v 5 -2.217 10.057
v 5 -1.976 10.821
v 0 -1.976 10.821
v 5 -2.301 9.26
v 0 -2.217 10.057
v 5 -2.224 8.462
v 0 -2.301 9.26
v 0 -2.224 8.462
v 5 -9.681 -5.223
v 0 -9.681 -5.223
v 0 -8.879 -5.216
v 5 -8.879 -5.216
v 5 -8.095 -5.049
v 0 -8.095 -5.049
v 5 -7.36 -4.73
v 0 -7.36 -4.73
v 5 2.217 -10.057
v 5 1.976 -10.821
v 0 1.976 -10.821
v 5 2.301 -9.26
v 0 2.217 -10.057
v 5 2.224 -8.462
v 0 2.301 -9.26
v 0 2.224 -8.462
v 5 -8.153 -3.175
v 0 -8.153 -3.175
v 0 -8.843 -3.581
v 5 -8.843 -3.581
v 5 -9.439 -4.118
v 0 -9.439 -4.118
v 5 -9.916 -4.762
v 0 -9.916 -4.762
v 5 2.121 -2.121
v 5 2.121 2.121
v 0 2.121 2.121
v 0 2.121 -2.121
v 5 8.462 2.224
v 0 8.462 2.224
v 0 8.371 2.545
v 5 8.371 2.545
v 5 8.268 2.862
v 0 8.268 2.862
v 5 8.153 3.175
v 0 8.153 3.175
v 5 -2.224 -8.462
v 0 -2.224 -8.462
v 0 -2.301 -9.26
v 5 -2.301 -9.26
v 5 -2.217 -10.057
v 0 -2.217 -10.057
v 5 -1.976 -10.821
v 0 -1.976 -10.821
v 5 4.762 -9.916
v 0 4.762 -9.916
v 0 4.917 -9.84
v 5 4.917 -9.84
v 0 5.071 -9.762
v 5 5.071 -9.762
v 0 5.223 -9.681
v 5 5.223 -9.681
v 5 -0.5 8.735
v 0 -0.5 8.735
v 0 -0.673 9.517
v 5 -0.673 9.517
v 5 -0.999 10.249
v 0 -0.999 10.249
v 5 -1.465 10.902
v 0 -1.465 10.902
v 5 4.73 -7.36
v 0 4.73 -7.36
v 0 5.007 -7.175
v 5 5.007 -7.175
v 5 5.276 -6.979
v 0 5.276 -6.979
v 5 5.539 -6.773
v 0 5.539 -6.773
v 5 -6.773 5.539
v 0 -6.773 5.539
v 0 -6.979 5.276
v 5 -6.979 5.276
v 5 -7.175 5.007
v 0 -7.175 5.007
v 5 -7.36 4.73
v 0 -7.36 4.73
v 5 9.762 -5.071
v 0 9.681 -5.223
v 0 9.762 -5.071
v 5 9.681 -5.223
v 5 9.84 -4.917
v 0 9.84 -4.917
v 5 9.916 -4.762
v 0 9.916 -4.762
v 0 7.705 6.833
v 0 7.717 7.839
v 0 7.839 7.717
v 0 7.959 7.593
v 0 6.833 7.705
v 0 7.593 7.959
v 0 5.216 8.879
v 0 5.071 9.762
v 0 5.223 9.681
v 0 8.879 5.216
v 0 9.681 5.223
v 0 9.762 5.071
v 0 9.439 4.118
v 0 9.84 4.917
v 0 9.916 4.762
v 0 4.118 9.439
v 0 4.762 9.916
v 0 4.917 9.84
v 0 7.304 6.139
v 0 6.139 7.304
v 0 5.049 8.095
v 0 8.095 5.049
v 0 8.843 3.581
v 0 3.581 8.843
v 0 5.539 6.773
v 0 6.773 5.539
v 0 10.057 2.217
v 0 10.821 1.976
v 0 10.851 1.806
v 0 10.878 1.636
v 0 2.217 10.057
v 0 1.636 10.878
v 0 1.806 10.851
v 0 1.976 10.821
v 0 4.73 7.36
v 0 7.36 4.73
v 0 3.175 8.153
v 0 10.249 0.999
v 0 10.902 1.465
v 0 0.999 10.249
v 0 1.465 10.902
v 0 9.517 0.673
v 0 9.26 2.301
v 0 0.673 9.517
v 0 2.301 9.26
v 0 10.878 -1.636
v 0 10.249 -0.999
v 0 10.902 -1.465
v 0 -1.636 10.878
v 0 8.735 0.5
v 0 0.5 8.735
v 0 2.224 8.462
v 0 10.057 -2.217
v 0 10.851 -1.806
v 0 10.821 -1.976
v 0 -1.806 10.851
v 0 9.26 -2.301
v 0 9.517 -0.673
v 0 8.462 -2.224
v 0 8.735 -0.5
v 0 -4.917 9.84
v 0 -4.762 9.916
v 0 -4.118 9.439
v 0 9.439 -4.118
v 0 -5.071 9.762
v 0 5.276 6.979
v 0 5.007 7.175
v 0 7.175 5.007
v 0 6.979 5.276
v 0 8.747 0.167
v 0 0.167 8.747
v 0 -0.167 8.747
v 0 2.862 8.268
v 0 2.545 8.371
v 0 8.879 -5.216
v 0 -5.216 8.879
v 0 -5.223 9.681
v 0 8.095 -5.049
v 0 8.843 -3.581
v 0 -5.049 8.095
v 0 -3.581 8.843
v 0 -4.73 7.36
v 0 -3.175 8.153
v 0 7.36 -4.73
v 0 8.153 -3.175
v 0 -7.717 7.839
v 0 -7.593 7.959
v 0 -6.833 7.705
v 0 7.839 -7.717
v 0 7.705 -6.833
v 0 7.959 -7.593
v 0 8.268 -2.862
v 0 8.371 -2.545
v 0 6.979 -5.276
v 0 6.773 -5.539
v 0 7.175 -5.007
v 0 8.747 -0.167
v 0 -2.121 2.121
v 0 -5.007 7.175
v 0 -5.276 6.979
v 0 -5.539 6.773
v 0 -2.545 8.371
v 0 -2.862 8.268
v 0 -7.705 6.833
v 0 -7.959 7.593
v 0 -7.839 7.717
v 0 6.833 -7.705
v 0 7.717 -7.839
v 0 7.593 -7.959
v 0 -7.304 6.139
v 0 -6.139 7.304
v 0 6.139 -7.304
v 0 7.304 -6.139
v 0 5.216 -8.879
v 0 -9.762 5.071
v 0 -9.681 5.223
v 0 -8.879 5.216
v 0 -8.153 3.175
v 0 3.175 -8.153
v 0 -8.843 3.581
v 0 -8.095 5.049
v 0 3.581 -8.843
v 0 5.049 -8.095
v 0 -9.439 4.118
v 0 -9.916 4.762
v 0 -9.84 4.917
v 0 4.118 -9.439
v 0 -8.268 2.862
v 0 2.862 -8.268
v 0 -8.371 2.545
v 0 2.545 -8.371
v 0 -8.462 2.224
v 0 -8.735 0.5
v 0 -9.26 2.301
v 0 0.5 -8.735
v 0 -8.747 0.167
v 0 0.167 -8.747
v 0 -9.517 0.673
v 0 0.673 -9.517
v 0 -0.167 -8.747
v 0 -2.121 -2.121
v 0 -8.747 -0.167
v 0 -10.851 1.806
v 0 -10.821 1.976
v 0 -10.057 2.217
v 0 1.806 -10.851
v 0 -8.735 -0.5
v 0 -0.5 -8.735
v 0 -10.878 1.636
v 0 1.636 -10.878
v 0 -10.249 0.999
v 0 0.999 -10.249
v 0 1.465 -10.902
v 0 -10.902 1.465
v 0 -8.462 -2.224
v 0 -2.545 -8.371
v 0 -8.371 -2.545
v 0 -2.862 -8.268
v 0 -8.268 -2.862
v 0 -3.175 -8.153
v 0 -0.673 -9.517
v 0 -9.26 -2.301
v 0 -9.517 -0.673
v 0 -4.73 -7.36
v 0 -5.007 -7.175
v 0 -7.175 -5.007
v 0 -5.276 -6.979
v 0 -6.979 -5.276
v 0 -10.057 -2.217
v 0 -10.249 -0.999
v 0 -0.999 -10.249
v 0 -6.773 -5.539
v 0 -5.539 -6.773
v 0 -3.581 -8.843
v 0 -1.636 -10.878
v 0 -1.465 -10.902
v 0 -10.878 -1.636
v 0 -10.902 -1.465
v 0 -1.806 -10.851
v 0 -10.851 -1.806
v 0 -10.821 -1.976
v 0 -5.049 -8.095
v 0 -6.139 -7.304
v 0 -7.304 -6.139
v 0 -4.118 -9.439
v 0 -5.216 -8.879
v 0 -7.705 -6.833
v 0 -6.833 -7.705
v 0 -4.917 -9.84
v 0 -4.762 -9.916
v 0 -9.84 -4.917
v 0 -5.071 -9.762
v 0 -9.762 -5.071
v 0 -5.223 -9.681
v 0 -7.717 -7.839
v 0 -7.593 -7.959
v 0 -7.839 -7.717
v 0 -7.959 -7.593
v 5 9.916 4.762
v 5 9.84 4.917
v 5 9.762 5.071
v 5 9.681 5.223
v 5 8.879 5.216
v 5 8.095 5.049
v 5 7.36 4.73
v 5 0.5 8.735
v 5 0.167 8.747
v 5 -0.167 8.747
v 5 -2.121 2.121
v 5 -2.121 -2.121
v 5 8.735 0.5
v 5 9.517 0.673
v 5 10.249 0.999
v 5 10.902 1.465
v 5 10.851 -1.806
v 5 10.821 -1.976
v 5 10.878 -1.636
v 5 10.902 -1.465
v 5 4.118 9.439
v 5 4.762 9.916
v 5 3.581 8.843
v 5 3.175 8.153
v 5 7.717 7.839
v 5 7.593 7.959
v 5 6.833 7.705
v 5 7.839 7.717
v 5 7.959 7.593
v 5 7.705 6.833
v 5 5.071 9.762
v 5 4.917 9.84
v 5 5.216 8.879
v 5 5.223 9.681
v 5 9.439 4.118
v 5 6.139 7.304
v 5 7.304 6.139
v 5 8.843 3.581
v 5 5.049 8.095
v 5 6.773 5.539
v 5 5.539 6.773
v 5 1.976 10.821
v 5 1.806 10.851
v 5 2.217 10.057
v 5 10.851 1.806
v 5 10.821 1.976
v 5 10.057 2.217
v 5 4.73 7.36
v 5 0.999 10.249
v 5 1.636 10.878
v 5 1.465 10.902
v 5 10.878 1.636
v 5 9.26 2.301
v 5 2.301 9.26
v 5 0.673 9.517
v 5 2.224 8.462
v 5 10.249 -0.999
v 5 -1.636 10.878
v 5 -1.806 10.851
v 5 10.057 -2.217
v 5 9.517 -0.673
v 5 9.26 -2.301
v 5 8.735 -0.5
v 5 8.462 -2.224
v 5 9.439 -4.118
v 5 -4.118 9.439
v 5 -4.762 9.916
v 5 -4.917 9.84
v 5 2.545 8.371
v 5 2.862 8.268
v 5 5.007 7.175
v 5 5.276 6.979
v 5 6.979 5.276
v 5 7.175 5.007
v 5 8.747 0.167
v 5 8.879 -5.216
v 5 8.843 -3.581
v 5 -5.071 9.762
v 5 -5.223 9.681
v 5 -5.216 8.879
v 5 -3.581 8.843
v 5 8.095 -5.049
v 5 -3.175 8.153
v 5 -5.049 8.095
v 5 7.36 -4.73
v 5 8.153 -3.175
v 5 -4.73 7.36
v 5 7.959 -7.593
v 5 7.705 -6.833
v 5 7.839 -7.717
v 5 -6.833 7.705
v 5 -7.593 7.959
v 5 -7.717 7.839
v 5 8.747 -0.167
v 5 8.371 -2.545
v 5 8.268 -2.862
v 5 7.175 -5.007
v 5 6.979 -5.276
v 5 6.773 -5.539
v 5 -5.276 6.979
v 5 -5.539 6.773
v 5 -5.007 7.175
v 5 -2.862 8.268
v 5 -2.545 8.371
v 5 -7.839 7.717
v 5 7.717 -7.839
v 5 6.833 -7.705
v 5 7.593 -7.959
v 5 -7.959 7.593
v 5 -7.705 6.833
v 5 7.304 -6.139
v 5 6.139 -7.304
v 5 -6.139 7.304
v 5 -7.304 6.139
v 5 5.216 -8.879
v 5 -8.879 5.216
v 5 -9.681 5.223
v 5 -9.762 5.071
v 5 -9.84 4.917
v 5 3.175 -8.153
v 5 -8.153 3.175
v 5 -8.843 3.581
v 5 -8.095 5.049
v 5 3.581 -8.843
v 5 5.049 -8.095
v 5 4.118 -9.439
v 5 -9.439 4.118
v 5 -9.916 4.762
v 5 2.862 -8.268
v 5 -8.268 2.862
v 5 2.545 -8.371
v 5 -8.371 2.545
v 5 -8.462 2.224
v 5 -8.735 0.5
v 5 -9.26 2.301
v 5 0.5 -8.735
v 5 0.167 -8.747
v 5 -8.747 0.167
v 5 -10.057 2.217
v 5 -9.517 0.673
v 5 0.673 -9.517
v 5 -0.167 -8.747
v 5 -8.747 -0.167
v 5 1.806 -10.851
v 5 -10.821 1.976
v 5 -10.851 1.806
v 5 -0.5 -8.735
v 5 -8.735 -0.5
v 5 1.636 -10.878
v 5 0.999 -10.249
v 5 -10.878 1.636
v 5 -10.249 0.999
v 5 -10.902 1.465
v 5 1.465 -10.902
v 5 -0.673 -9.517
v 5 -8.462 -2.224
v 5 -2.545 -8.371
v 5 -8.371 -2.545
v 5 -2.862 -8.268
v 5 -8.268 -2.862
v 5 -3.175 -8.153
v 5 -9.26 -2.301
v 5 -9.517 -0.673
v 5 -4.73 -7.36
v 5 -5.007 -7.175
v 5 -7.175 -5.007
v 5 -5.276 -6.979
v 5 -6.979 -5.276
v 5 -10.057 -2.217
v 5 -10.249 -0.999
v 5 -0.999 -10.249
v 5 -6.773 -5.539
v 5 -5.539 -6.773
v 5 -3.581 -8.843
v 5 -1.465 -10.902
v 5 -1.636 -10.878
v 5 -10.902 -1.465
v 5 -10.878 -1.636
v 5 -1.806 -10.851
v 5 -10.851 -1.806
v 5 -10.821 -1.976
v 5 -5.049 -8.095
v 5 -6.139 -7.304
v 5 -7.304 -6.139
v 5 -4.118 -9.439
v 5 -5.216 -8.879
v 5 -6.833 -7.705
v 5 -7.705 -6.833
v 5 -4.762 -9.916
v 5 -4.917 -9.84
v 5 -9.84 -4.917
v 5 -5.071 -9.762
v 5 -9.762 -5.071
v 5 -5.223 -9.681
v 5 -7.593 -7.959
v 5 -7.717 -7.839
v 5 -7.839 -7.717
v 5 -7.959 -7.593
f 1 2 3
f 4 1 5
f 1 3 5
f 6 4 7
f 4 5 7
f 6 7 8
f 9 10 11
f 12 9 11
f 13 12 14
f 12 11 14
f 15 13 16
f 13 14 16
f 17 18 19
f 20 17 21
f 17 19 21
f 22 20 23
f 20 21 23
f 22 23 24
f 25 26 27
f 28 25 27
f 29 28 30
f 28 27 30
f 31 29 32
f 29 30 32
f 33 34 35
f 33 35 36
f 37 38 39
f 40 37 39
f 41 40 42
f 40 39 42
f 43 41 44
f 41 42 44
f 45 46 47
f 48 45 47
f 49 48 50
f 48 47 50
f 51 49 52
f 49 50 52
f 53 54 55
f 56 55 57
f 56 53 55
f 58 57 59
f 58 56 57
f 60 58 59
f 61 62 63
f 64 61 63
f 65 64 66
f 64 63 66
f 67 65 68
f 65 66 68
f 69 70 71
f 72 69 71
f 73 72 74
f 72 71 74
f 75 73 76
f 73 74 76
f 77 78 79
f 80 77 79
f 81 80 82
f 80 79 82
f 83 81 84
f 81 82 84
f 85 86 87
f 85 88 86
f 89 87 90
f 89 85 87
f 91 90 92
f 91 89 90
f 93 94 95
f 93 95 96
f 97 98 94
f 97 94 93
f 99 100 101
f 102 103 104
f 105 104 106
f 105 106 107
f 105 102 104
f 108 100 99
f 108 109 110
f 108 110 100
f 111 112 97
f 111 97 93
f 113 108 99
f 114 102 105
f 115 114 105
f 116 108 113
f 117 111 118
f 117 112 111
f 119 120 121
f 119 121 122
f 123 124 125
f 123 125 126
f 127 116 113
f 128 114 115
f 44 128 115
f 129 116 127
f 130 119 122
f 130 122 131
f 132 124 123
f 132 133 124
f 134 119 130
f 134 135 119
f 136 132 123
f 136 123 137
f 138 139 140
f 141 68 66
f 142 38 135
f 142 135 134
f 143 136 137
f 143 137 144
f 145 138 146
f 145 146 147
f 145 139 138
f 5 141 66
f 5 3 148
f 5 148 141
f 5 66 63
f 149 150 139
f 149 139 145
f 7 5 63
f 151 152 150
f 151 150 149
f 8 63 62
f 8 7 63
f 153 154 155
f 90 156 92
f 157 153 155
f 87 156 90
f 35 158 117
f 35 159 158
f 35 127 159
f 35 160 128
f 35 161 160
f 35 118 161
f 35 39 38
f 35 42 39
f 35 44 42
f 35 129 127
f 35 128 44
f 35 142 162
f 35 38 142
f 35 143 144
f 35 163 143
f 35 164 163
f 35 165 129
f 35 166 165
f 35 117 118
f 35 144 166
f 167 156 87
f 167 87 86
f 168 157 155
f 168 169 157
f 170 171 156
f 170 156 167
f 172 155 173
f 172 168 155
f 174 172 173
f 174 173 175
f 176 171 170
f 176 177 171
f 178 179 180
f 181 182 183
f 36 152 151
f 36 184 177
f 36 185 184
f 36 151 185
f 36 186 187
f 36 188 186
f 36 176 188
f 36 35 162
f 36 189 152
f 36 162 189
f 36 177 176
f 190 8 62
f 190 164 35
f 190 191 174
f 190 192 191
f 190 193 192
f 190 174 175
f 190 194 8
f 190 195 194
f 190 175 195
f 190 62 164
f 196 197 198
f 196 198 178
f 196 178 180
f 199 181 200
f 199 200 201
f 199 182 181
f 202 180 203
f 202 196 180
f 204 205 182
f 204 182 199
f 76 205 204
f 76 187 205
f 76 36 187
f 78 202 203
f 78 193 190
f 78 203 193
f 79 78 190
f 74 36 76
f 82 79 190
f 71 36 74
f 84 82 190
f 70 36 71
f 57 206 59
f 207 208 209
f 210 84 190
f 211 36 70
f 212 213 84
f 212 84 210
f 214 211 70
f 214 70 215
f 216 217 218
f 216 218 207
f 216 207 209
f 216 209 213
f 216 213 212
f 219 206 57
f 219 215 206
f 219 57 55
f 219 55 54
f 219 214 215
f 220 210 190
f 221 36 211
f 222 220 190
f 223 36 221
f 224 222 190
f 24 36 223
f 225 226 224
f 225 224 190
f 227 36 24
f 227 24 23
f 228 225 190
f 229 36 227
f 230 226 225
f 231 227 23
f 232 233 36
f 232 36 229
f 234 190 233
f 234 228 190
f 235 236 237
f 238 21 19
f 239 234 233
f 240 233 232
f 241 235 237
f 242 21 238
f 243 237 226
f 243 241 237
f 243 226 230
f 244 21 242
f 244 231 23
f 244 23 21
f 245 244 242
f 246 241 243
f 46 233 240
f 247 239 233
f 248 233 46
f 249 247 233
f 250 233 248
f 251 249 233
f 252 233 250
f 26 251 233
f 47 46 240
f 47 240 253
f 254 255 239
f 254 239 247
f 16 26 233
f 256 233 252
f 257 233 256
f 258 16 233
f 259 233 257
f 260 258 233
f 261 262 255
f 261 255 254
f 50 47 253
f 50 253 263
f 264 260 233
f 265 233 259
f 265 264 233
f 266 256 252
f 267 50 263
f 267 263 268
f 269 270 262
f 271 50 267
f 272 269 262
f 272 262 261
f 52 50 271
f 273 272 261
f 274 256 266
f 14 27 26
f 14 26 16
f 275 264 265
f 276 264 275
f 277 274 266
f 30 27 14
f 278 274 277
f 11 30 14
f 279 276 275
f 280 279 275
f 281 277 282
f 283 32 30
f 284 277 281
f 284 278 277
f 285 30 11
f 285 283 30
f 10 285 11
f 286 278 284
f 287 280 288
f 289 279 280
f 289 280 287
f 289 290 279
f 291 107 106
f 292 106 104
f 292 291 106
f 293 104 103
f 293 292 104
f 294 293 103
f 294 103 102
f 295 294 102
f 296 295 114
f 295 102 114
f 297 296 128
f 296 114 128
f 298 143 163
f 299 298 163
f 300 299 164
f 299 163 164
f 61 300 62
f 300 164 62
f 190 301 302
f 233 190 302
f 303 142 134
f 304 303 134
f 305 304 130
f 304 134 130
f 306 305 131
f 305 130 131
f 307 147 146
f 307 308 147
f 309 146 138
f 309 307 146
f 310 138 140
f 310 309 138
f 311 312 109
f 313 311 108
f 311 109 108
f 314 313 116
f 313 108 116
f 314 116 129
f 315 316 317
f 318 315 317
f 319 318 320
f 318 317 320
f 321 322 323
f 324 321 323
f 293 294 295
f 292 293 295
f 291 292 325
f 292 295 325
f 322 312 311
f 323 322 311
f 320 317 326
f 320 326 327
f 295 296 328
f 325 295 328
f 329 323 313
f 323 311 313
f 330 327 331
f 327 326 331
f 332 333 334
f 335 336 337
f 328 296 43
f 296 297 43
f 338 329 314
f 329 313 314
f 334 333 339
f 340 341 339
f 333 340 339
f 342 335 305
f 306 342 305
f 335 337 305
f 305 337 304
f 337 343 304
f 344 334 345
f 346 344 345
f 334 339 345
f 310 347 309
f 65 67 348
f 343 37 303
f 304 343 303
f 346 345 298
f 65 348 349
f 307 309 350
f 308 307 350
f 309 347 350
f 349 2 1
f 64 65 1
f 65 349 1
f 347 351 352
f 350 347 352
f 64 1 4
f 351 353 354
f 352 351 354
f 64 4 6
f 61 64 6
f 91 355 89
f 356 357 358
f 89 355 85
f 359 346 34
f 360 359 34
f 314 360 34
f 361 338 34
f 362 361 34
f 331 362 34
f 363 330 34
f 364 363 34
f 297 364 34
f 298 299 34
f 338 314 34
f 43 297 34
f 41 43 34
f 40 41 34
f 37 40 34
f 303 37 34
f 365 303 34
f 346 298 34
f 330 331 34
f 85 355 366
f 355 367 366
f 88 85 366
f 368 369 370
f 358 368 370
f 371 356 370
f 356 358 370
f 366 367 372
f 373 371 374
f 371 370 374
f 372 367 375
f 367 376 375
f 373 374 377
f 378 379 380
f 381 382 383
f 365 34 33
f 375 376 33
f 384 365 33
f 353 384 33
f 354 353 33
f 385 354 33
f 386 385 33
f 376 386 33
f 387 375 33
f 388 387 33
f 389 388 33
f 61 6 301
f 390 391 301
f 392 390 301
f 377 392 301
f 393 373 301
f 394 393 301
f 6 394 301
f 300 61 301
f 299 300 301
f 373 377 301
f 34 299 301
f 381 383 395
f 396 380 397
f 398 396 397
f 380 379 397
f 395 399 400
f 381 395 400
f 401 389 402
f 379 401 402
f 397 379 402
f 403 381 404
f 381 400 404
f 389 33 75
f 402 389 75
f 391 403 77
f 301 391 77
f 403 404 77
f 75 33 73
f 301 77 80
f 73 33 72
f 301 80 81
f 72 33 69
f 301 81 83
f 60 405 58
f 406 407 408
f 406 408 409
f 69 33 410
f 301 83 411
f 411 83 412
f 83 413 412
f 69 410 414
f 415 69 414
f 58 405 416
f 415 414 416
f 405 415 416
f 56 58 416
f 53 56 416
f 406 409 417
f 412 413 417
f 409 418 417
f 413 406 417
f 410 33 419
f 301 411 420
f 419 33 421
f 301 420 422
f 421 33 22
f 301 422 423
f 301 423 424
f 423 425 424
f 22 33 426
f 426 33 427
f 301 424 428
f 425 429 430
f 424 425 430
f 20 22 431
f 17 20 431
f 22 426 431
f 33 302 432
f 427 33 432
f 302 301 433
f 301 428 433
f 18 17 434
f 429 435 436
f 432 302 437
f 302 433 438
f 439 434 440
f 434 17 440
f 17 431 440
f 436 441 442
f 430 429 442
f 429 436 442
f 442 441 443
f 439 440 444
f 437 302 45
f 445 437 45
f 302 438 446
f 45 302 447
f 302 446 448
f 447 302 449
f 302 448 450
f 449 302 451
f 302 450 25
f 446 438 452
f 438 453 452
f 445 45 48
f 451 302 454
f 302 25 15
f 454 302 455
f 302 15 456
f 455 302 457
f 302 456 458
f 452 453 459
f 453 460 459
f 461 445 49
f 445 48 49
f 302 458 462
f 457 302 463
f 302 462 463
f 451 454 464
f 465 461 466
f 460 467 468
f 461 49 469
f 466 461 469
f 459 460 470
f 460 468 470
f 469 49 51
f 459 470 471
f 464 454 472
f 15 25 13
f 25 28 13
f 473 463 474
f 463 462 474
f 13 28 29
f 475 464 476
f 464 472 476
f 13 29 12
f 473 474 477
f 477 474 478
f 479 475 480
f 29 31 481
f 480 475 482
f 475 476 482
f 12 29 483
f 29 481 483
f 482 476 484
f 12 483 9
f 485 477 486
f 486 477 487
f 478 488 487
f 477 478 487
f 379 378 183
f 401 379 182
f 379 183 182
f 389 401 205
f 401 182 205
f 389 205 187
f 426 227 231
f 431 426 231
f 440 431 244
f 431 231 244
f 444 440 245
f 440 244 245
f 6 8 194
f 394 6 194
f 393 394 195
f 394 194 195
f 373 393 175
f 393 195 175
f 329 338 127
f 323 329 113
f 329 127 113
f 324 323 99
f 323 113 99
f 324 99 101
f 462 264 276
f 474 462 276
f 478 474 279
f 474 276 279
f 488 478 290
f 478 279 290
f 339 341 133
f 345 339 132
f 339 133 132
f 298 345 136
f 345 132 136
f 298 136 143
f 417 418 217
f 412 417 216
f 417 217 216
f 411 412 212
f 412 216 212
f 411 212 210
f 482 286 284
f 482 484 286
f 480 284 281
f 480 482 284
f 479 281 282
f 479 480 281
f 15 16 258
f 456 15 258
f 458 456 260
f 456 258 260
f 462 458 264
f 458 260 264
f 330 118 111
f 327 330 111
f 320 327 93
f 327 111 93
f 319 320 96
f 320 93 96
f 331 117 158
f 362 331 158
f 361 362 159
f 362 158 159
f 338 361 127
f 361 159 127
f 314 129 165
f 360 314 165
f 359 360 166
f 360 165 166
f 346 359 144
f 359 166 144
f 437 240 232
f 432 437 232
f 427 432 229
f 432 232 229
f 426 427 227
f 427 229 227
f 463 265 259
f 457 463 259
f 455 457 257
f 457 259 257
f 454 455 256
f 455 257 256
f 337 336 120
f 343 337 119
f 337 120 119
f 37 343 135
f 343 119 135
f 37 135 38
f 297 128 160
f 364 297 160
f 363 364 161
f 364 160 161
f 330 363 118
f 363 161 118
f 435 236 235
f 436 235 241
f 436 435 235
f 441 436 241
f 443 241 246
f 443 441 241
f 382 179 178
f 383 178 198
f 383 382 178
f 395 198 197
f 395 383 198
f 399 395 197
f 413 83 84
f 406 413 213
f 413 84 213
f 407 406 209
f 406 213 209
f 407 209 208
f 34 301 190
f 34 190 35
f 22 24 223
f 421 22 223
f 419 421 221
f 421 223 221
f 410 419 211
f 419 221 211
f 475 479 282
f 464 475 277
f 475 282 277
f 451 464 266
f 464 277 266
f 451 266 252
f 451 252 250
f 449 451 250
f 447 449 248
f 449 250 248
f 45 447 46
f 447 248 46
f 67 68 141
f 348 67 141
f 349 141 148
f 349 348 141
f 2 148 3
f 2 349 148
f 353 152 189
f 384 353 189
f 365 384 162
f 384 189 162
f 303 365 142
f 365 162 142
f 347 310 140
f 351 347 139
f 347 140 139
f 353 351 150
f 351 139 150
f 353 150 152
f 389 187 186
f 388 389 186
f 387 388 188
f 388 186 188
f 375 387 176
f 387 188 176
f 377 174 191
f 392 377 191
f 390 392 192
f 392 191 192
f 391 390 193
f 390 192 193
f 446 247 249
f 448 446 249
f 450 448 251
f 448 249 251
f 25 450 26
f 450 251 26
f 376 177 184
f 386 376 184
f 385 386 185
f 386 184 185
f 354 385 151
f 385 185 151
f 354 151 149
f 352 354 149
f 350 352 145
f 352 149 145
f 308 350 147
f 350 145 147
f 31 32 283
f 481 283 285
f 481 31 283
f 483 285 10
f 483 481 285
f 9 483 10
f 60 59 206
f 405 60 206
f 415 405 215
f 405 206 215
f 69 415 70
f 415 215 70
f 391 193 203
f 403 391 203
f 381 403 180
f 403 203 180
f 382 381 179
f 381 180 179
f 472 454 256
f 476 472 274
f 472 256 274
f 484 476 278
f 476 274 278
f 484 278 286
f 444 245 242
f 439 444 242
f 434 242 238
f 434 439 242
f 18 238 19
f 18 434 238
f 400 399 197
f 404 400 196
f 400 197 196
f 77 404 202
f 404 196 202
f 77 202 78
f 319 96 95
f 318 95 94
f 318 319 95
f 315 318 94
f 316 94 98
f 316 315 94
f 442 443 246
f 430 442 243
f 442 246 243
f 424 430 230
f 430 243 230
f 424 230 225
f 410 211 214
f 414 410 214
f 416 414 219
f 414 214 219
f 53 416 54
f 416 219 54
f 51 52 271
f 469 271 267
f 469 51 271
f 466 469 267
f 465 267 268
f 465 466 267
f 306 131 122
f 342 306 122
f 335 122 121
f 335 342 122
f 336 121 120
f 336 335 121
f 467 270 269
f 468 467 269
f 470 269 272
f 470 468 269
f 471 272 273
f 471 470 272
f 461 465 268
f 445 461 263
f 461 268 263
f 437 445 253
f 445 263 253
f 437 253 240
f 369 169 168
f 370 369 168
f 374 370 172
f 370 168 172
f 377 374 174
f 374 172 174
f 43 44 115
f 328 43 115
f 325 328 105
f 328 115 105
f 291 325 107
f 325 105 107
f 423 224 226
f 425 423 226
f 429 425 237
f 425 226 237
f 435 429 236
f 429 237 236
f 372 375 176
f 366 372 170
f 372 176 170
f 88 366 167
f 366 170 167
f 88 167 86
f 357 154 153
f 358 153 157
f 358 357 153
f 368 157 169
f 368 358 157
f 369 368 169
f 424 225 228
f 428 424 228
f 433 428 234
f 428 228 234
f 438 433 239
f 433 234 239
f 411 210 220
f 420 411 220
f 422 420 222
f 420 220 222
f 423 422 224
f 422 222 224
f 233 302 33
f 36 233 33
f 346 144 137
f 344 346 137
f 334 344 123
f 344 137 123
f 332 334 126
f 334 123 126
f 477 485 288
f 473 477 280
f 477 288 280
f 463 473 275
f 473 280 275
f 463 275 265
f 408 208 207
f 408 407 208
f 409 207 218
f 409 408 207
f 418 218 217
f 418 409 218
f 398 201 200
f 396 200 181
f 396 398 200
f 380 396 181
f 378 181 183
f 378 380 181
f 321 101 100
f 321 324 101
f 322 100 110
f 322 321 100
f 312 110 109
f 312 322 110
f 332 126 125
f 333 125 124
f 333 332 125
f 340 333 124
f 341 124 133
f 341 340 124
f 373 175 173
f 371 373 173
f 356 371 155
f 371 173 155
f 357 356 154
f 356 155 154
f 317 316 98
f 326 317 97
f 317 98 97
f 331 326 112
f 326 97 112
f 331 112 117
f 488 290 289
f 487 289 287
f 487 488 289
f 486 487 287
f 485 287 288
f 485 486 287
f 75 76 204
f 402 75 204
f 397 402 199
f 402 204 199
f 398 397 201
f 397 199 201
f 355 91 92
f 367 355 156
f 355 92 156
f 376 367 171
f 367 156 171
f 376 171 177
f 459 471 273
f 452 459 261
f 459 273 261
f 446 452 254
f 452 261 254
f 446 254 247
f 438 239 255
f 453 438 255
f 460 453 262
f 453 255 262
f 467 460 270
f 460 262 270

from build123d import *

# Parameters (mm, degrees)
BASPROSKE_W        = 5
BASPROSKE_H        = 11
TOOTHCUT_DEPTH     = 17.340134638
TEETHCUTS_COUNT    = 20
TEETHCUTS_ANGLE    = 342
BORSKE_R           = 0.4
BORE_DEPTH         = 50.0000508
SKETCH1_W          = 4.242640688
SKETCH1_H          = 4.242640688
CUT_EXTRUDE1_DEPTH = 17.208263488


with BuildPart() as part:
    # BasProSke → Base-Revolve (revolve)
    with BuildSketch(Plane(origin=(0, 0, 0), x_dir=(1, 0, 0), z_dir=(0, 1, 0)), mode=Mode.PRIVATE) as base_revolve_sk:
        with Locations((2.5, 5.5)):
            Rectangle(BASPROSKE_W, BASPROSKE_H)
    revolve(base_revolve_sk.sketch.rotate(Axis((-10, 0, 0), (1, 0, 0)), 180), axis=Axis((-10, 0, 0), (1, 0, 0)))

    # TooCutSke → ToothCut (cut, through all)
    with BuildSketch(Plane(origin=(0, 0, 0), x_dir=(0, 0, -1), z_dir=(1, 0, 0))):
        with BuildLine():
            ThreePointArc((0.499924007, 8.734705318), (0, 8.749), (-0.499924007, 8.734705318))
            ThreePointArc((-0.499924007, 8.734705318), (-0.824302243, 9.905497836), (-1.485192705, 10.924909509))
            ThreePointArc((-1.485192705, 10.924909509), (0, 11.0254), (1.485192705, 10.924909509))
            ThreePointArc((1.485192705, 10.924909509), (0.824302243, 9.905497836), (0.499924007, 8.734705318))
        make_face()
    toothcut = extrude(amount=TOOTHCUT_DEPTH, mode=Mode.SUBTRACT)

    # TeethCuts: ToothCut ×20 about axis
    teethcuts_axis = Axis((-10, 0, 0), (1, 0, 0))
    for i in range(1, TEETHCUTS_COUNT):
        add(toothcut.rotate(teethcuts_axis, i * TEETHCUTS_ANGLE / (TEETHCUTS_COUNT - 1)), mode=Mode.SUBTRACT)

    # BorSke → Bore (cut, symmetric)
    with BuildSketch(Plane(origin=(0, 0, 0), x_dir=(0, 0, -1), z_dir=(1, 0, 0))):
        with Locations(Location((0, 0, 0), (0, 0, 180))):
            Circle(BORSKE_R)
    extrude(amount=BORE_DEPTH, both=True, mode=Mode.SUBTRACT)

    # Sketch1 → Cut-Extrude1 (cut, through all)
    with BuildSketch(Plane(origin=(5, 0, 0), x_dir=(0, 0, -1), z_dir=(1, 0, 0))):
        Rectangle(SKETCH1_W, SKETCH1_H)
    extrude(amount=-CUT_EXTRUDE1_DEPTH, mode=Mode.SUBTRACT)


solid = part.part
